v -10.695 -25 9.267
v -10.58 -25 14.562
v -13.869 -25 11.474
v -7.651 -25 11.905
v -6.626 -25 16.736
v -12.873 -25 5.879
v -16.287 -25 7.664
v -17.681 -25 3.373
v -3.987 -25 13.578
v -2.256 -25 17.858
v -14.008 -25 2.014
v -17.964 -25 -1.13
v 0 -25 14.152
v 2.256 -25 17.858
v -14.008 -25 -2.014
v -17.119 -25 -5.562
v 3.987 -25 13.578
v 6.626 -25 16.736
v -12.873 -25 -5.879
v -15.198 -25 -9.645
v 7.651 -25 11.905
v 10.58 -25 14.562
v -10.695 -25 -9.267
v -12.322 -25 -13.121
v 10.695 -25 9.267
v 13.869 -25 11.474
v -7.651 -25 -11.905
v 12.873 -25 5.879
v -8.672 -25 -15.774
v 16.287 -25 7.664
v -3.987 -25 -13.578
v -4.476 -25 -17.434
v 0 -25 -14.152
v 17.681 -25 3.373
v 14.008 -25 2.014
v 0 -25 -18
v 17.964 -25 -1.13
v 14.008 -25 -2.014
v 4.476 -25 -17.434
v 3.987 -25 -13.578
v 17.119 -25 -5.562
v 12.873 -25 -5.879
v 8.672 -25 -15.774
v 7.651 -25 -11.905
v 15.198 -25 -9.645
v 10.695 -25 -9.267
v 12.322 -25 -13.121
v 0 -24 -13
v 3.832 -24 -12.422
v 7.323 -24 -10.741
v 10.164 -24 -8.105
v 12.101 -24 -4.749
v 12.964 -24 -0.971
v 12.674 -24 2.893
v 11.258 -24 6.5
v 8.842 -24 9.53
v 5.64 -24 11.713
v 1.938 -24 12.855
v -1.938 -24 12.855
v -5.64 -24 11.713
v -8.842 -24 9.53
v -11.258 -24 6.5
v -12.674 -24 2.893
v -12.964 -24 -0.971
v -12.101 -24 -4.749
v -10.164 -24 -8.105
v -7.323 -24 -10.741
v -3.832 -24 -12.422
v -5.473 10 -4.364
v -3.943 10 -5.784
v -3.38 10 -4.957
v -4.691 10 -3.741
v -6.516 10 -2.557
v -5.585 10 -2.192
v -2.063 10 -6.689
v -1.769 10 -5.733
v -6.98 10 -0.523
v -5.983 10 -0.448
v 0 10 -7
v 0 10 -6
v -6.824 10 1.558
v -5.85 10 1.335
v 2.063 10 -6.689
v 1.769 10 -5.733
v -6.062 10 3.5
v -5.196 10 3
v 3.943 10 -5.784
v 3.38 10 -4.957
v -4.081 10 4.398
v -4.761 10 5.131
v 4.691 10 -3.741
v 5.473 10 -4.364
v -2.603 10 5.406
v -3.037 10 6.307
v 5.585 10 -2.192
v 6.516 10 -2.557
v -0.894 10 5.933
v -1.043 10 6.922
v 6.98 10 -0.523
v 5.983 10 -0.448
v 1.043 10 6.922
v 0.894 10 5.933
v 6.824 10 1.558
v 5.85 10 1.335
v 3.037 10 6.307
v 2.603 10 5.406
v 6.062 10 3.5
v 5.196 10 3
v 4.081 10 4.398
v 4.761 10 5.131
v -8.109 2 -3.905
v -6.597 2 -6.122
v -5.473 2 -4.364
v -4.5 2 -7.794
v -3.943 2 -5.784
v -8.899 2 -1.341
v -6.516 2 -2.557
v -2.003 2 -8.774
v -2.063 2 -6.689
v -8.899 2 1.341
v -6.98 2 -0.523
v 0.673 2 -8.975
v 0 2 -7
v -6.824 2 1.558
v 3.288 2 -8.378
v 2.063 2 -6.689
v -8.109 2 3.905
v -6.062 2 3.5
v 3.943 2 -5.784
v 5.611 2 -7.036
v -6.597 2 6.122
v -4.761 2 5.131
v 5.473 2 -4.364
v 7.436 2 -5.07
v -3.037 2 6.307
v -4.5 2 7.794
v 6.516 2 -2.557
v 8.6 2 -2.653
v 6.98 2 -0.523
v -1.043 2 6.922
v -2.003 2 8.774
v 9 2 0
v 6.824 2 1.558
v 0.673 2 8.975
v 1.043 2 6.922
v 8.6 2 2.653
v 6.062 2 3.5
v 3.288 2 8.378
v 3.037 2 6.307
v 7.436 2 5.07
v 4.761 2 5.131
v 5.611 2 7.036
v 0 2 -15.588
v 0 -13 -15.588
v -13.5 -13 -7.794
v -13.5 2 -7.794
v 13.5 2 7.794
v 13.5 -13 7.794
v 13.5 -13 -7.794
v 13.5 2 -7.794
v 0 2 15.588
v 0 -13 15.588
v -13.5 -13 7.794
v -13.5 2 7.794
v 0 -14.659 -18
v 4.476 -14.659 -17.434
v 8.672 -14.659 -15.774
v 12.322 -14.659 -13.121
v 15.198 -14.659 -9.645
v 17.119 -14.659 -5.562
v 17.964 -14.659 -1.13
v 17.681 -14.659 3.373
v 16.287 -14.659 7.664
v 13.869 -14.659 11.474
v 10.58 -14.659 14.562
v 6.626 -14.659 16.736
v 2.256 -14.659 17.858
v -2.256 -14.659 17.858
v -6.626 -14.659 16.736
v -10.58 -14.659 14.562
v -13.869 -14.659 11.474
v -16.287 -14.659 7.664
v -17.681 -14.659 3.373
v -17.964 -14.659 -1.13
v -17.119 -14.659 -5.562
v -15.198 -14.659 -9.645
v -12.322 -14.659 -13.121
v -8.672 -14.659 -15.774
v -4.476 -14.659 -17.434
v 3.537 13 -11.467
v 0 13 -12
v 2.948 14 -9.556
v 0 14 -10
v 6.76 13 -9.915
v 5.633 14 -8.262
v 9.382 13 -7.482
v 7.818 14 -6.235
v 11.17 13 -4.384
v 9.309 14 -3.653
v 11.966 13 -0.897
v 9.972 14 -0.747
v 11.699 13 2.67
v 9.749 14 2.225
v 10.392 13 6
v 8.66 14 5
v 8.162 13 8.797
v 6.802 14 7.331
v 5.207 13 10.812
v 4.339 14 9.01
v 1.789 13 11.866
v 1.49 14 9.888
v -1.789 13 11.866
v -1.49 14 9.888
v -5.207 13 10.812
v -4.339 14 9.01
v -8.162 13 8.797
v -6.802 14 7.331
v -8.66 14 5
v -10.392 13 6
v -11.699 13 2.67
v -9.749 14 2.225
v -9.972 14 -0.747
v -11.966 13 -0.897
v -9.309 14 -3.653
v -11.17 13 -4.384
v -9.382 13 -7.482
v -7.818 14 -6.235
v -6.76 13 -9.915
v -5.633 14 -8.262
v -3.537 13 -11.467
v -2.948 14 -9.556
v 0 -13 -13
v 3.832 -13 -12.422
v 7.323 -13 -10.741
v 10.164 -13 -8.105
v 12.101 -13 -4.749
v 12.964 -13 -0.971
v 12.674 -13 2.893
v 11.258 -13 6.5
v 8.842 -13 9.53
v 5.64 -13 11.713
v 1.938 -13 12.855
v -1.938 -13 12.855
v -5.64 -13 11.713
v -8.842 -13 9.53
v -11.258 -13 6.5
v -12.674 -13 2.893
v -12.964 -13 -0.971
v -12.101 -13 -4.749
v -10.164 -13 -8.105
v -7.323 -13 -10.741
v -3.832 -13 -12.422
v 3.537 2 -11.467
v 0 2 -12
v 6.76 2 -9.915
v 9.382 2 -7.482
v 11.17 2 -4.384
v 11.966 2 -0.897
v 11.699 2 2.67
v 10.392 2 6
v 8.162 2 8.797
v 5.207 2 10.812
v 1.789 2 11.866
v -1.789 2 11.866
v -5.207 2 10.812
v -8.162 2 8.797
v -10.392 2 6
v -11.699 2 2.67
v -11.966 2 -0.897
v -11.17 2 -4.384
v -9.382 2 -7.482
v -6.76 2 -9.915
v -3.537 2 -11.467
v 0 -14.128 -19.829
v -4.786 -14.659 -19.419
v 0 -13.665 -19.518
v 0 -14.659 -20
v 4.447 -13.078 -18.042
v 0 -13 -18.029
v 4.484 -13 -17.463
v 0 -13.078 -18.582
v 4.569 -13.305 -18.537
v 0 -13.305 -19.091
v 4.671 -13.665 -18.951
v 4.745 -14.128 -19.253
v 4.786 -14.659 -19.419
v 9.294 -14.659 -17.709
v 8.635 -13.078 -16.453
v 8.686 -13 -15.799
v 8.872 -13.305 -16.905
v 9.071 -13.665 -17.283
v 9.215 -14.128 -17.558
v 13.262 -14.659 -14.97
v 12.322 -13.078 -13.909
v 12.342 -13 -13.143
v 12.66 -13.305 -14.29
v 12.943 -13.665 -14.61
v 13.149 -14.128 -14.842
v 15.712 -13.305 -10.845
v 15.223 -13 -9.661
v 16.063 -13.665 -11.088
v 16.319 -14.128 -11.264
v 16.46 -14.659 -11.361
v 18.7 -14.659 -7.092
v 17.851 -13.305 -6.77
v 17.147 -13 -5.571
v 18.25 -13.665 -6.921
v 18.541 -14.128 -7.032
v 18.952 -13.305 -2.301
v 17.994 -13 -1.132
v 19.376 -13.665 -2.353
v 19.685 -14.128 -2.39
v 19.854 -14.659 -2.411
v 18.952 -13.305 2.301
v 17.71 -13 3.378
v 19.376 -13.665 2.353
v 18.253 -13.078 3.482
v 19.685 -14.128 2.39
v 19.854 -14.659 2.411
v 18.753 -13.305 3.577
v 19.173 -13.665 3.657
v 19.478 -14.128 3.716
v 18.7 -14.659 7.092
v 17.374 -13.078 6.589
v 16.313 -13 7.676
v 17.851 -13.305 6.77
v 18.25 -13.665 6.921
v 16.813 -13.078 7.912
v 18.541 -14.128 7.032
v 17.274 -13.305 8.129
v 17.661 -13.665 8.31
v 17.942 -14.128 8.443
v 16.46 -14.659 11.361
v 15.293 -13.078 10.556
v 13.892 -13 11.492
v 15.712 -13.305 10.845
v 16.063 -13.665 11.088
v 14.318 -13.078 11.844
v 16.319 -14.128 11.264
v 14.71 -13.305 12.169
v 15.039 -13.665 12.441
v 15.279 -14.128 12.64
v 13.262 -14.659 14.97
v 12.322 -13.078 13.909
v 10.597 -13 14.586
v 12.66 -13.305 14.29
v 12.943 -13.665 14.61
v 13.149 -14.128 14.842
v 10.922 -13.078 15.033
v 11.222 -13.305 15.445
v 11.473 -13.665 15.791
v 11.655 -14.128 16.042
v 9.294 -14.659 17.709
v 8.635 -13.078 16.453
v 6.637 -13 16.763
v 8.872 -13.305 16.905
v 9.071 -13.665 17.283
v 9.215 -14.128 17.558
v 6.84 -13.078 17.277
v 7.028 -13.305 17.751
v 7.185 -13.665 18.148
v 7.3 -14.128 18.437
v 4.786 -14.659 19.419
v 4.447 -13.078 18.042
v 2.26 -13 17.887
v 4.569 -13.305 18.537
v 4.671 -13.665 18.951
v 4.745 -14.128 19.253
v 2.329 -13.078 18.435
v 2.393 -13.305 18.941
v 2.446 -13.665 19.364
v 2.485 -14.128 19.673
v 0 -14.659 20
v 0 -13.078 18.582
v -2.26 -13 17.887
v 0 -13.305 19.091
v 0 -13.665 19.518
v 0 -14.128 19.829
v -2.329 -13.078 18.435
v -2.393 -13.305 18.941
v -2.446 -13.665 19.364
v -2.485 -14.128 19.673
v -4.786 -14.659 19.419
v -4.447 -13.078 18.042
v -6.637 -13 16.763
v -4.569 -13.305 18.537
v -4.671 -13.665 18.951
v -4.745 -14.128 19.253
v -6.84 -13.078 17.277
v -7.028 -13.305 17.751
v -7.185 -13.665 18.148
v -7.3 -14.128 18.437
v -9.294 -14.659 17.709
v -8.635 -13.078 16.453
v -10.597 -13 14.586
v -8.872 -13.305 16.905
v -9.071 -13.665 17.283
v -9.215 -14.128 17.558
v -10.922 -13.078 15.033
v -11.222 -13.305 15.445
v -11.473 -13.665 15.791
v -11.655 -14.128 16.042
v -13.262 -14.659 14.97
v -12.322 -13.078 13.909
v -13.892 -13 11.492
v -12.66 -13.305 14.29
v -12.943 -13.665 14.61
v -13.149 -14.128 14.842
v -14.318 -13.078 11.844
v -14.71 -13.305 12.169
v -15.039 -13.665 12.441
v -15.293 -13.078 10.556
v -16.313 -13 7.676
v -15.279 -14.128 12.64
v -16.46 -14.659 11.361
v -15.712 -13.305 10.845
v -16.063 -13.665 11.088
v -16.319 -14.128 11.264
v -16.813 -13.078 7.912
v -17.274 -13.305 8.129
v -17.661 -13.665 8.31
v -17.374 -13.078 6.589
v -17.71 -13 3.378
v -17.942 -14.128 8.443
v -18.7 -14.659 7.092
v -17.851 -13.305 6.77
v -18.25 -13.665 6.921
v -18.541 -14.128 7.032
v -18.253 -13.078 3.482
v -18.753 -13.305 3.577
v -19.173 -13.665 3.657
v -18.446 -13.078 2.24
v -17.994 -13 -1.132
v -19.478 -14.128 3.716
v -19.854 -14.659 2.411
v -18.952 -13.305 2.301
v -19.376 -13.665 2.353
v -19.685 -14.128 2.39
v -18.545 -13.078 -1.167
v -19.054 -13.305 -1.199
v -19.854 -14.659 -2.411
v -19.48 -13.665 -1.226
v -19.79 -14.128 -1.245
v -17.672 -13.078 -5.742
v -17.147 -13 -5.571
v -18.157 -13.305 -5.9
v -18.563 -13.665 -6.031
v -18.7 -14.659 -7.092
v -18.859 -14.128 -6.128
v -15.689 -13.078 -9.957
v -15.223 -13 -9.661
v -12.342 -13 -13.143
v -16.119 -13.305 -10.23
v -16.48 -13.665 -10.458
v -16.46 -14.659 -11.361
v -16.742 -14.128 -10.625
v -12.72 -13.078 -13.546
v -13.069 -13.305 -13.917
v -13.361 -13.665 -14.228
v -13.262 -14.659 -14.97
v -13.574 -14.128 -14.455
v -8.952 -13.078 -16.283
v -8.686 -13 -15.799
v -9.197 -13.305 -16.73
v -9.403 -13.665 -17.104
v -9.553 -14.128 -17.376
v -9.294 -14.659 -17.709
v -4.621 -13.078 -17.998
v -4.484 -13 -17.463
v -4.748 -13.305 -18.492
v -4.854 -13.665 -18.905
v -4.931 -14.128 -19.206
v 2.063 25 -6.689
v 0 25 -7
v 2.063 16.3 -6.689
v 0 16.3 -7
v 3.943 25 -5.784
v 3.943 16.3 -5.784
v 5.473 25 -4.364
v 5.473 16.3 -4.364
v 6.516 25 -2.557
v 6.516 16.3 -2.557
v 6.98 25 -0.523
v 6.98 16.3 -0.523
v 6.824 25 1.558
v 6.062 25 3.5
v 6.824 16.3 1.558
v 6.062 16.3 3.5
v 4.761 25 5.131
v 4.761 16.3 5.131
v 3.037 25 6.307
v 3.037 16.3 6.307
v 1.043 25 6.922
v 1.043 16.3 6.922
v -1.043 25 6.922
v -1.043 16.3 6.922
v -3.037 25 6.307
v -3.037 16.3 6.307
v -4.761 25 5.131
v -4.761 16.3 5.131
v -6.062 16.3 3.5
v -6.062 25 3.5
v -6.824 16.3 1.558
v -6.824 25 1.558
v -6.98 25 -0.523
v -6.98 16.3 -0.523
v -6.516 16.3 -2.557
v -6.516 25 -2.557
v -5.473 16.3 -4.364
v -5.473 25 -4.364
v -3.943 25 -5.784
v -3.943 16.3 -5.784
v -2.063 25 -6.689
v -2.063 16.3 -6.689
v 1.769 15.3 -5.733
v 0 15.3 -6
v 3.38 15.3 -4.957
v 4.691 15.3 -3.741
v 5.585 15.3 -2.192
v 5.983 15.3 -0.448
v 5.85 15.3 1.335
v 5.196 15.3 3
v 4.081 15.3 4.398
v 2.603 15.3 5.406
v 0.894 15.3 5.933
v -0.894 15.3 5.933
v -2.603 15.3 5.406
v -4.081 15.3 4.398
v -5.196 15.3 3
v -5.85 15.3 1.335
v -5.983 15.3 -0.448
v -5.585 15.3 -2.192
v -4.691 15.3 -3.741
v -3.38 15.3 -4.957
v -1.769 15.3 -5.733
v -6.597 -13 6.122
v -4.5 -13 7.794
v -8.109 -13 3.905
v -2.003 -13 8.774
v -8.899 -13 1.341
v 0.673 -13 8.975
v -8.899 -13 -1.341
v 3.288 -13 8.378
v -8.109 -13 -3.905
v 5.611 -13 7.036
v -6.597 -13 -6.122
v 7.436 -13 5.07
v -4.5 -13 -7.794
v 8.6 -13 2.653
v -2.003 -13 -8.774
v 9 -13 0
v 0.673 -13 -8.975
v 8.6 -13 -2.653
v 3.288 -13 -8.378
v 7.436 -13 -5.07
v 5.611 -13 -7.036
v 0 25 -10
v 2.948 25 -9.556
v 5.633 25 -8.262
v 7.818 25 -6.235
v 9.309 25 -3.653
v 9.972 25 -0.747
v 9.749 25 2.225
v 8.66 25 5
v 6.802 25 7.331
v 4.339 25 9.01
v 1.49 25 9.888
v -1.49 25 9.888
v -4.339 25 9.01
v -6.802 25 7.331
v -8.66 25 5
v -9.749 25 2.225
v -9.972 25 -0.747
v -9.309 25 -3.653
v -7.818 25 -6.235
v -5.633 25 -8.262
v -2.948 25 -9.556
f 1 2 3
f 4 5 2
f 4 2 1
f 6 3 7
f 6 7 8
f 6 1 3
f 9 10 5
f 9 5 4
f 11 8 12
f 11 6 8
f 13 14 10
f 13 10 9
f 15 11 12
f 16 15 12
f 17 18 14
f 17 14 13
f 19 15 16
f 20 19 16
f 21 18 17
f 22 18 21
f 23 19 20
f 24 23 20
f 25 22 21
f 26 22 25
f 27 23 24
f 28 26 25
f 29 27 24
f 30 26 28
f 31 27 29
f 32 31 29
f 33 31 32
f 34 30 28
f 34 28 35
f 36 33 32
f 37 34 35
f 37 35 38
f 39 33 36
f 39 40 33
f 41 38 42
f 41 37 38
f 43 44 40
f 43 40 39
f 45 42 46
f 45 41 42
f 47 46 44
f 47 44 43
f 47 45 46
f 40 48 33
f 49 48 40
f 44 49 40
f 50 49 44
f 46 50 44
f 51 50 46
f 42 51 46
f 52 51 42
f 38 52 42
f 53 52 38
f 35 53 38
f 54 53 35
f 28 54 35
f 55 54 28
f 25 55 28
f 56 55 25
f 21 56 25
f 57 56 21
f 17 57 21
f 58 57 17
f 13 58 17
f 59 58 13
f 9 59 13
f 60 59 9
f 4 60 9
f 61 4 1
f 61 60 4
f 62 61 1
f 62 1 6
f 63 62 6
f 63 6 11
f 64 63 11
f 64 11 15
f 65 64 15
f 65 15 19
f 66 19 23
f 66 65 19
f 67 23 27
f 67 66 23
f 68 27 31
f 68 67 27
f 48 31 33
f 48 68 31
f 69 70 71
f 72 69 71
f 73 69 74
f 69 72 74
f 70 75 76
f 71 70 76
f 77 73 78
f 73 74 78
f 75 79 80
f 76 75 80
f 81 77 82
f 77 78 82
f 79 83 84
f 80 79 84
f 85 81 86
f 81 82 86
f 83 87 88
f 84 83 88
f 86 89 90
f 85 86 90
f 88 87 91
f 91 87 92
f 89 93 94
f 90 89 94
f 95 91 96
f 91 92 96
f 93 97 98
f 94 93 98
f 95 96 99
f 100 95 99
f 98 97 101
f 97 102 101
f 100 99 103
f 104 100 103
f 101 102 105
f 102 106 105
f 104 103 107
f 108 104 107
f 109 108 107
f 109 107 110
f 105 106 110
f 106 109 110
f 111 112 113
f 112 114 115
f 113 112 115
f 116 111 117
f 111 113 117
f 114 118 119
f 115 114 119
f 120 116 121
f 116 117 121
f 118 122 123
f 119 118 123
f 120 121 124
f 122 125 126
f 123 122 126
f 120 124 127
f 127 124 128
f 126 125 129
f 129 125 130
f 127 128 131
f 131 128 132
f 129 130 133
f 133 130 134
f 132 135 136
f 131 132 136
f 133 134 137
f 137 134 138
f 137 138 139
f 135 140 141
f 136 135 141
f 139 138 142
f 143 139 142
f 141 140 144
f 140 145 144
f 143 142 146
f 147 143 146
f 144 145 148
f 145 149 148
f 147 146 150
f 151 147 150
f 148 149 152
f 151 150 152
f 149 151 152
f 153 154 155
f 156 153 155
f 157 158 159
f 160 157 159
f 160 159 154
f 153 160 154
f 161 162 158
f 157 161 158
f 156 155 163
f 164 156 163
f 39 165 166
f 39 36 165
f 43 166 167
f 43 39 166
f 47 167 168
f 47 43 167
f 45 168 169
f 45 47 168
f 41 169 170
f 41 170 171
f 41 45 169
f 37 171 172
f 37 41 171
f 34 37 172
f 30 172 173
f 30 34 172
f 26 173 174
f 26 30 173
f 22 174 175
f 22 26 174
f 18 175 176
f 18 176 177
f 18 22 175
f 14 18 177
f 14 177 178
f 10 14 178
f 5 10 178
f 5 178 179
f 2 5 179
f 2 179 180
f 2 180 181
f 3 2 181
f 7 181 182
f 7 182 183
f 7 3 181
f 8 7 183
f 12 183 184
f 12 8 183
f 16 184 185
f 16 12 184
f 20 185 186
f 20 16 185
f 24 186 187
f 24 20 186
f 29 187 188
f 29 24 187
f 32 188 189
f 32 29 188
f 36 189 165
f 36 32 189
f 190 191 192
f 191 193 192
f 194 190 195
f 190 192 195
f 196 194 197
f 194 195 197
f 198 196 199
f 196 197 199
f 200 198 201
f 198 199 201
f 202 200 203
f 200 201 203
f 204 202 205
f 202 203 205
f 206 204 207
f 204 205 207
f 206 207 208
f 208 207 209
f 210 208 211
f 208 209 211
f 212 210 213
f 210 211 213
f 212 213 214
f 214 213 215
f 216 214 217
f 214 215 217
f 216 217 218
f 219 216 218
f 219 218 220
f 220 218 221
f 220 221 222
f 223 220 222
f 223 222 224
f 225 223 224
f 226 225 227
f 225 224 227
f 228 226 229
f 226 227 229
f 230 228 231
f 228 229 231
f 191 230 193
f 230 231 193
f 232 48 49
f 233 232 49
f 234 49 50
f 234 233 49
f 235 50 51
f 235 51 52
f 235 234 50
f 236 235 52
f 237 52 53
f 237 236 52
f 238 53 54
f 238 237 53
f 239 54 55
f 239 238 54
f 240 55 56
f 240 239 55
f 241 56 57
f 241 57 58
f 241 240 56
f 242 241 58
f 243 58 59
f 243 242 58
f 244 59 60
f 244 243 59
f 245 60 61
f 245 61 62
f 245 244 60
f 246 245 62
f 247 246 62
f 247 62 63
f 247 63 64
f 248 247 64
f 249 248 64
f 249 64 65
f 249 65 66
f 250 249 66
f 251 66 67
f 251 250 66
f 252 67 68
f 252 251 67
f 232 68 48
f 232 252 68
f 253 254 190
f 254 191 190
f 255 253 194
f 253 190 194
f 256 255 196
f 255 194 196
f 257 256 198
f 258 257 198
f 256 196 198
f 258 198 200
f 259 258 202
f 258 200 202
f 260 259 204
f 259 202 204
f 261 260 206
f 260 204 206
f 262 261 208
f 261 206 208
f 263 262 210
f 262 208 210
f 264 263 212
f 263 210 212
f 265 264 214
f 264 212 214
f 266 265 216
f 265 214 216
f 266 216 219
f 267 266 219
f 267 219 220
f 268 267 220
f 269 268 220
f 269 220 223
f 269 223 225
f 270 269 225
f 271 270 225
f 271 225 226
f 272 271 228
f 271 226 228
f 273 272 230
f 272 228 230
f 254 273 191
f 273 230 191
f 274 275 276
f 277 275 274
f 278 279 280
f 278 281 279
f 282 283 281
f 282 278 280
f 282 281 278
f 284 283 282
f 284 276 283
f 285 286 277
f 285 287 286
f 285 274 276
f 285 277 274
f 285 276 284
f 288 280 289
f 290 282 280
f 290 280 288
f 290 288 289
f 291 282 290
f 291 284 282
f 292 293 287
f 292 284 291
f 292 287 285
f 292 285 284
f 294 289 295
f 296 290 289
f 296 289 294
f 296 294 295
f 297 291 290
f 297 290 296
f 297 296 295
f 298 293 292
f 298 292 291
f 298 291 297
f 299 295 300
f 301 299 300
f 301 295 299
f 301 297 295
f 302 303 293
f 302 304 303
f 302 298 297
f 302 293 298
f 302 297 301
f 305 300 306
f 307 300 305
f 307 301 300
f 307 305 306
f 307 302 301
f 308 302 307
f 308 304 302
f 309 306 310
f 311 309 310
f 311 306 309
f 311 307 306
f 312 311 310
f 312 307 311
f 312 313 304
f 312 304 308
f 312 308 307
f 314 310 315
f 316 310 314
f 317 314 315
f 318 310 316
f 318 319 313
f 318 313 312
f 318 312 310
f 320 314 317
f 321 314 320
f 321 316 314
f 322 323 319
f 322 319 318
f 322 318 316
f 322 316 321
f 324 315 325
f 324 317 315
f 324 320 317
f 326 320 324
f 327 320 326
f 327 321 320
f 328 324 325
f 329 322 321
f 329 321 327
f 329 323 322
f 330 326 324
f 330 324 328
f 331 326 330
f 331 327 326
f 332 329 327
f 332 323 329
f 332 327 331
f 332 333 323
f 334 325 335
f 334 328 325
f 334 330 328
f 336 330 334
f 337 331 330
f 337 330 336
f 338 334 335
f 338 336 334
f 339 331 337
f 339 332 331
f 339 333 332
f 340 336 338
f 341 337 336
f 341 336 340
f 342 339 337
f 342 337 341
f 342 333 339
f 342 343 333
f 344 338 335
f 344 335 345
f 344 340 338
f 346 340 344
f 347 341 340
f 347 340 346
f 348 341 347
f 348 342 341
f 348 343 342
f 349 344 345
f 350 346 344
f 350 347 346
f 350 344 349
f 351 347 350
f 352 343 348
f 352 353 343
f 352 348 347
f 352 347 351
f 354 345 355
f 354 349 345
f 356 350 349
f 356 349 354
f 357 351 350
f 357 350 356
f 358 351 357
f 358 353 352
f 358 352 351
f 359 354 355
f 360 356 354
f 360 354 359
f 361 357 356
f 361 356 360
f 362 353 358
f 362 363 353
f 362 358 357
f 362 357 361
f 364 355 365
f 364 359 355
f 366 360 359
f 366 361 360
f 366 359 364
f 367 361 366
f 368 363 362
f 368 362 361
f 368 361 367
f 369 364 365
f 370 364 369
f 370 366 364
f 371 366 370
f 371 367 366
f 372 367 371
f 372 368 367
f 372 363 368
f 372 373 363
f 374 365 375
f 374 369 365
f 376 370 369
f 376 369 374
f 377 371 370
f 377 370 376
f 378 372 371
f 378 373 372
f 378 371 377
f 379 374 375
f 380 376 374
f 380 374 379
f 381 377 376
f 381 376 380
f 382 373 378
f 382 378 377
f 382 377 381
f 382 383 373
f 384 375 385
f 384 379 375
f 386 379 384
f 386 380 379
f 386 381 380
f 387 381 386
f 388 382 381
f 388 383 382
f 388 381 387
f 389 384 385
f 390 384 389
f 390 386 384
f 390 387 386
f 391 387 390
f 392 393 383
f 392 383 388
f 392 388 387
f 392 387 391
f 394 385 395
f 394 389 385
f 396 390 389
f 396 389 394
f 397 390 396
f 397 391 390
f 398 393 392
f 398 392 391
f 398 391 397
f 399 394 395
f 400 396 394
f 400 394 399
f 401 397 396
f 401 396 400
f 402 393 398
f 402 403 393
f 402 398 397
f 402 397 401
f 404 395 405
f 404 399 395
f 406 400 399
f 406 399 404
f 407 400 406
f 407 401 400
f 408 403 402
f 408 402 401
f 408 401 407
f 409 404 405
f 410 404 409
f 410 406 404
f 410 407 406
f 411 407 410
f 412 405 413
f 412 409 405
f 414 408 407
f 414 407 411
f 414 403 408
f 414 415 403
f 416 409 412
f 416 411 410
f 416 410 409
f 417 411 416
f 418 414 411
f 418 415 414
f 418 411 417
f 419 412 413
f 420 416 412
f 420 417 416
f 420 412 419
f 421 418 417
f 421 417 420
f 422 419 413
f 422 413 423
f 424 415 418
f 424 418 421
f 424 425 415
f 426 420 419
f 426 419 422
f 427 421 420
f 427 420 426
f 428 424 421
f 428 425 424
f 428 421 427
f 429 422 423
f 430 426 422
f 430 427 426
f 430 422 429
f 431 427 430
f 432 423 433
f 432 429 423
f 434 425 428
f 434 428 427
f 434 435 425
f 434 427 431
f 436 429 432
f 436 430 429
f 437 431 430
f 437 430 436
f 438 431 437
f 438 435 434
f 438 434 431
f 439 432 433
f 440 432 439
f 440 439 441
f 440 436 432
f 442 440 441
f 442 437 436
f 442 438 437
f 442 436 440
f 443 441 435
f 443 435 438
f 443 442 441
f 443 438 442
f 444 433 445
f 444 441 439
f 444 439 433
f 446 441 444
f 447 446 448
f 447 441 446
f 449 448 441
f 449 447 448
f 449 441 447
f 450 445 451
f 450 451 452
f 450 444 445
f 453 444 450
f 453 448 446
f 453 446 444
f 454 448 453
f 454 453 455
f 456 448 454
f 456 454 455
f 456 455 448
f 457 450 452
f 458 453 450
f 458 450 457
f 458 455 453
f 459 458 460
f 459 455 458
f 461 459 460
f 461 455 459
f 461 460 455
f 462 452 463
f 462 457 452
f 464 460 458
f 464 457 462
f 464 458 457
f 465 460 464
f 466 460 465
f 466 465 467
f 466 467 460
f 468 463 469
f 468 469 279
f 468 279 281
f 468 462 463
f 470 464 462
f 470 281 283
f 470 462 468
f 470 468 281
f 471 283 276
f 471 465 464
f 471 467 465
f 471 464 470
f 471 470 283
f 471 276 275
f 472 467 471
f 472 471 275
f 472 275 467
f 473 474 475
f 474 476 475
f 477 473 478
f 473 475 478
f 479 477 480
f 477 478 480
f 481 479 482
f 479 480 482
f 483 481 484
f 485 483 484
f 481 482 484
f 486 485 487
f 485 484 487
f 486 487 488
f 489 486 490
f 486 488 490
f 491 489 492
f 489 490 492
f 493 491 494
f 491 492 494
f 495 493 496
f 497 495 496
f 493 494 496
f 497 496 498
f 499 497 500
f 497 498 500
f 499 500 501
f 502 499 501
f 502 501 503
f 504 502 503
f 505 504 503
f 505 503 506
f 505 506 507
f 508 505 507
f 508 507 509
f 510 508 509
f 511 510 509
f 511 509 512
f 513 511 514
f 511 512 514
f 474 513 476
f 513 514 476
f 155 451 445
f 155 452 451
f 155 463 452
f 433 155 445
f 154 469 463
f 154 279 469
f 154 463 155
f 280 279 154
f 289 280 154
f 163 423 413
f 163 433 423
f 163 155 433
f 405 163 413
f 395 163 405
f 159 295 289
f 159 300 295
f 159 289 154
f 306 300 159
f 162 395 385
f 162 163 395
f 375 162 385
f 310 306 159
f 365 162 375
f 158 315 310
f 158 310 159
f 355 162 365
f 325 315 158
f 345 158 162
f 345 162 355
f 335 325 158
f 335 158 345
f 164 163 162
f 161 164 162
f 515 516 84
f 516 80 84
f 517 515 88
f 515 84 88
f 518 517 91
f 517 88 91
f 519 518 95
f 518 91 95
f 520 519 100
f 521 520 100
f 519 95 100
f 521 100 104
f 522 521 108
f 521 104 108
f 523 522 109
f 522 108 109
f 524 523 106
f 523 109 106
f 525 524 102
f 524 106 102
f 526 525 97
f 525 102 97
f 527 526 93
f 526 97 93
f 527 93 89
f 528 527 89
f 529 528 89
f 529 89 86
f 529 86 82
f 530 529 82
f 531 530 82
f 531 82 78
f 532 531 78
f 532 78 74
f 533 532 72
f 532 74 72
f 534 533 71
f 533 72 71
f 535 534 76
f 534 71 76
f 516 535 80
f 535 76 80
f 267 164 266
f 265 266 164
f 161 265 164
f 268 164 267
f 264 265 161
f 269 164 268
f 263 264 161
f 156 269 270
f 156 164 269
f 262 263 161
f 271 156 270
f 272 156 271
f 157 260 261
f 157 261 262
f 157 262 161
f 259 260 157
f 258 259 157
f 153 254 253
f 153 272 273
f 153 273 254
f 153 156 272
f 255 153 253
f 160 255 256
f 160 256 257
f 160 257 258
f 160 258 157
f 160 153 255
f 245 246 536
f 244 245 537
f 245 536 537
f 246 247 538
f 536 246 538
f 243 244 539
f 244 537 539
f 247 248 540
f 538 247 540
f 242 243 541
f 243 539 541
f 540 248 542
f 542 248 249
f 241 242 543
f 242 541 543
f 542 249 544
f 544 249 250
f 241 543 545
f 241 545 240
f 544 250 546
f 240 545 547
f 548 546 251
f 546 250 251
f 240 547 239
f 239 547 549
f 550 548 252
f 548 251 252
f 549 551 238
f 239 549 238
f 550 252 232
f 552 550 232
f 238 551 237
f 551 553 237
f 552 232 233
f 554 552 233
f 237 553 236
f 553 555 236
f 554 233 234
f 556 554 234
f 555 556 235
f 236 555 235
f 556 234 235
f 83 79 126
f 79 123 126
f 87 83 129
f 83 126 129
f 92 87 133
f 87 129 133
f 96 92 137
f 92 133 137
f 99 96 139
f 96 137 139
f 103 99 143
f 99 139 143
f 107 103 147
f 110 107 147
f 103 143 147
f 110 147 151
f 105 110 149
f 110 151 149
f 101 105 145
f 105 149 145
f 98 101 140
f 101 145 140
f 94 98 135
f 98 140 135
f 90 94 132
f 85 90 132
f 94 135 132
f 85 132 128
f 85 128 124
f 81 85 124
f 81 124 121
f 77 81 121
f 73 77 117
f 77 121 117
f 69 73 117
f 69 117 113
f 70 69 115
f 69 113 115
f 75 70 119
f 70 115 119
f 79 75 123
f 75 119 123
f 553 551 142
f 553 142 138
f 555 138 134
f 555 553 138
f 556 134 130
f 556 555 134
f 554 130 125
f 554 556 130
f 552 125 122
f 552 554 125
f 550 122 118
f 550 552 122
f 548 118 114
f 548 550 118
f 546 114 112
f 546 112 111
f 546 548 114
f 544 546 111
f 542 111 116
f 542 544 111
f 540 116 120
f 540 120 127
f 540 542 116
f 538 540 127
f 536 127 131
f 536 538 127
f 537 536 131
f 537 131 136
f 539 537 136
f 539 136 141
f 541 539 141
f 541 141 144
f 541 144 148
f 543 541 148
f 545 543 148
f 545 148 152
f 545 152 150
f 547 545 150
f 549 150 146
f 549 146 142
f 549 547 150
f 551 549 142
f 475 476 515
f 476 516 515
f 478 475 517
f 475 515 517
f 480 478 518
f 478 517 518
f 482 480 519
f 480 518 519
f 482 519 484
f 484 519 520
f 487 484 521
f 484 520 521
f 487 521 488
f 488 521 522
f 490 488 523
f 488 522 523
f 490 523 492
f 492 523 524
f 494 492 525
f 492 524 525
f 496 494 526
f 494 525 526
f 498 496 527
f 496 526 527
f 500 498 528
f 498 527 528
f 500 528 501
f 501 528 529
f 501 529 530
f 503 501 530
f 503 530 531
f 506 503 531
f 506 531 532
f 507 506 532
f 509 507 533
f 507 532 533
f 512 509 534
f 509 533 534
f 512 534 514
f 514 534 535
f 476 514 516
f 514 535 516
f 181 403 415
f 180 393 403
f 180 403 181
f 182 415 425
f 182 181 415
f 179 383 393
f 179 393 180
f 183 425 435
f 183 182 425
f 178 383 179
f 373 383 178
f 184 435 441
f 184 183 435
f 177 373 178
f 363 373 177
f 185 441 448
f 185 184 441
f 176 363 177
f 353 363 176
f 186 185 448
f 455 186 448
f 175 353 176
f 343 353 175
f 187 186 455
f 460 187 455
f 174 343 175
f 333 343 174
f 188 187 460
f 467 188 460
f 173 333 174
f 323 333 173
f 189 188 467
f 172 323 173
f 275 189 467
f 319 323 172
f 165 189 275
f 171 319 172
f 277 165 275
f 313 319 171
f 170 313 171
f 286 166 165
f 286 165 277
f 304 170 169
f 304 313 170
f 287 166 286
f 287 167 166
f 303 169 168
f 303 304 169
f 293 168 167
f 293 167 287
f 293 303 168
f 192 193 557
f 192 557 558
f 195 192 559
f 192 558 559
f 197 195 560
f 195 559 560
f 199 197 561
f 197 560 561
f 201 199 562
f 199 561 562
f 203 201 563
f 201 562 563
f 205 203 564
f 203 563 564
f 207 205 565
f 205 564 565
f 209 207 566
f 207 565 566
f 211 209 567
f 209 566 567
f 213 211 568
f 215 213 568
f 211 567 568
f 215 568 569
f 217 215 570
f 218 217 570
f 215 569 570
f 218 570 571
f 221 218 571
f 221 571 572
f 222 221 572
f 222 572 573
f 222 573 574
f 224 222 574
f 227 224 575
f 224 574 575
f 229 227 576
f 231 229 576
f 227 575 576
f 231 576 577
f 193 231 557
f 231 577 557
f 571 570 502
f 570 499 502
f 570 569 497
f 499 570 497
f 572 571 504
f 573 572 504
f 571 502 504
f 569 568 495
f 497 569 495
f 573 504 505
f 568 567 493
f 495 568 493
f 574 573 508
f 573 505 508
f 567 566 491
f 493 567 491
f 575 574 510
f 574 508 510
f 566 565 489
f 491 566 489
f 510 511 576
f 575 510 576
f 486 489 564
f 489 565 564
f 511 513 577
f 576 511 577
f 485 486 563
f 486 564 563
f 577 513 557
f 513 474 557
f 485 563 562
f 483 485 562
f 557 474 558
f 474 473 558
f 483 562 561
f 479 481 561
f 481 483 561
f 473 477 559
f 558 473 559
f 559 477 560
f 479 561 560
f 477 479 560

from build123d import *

# Parameters (mm, degrees)
SKETCH2_R           = 9
BOSS_EXTRUDE2_DEPTH = 15


with BuildPart() as part:
    # Sketch1 → Revolve1 (revolve)
    with BuildSketch(Plane(origin=(0, 0, 0), x_dir=(0, 0, -1), z_dir=(1, 0, 0))):
        with BuildLine():
            Line((13, -24), (13, -13))
            Line((13, -13), (18.02920611, -13))
            ThreePointArc((18.02920611, -13), (19.317404153, -13.470115755), (20, -14.659454198))
            Line((20, -14.659454198), (18, -14.659454198))
            Line((18, -14.659454198), (18, -25))
            Line((18, -25), (14.151715331, -25))
            Line((14.151715331, -25), (13, -24))
        make_face()
        Polygon((10, 25), (7, 25), (7, 16.3), (6, 15.3), (6, 10), (7, 10), (7, 2), (12, 2), (12, 13), (10, 14), align=None)
    revolve(axis=Axis((0, 25, 0), (0, -1, 0)))

    # Sketch2 → Boss-Extrude2 (add)
    with BuildSketch(Plane(origin=(0, -13, 0), x_dir=(1, 0, 0), z_dir=(0, 1, 0))):
        Polygon((0, 15.588457268), (-13.5, 7.794228634), (-13.5, -7.794228634), (0, -15.588457268), (13.5, -7.794228634), (13.5, 7.794228634), align=None)
        Circle(SKETCH2_R, mode=Mode.SUBTRACT)
    extrude(amount=BOSS_EXTRUDE2_DEPTH)


solid = part.part
